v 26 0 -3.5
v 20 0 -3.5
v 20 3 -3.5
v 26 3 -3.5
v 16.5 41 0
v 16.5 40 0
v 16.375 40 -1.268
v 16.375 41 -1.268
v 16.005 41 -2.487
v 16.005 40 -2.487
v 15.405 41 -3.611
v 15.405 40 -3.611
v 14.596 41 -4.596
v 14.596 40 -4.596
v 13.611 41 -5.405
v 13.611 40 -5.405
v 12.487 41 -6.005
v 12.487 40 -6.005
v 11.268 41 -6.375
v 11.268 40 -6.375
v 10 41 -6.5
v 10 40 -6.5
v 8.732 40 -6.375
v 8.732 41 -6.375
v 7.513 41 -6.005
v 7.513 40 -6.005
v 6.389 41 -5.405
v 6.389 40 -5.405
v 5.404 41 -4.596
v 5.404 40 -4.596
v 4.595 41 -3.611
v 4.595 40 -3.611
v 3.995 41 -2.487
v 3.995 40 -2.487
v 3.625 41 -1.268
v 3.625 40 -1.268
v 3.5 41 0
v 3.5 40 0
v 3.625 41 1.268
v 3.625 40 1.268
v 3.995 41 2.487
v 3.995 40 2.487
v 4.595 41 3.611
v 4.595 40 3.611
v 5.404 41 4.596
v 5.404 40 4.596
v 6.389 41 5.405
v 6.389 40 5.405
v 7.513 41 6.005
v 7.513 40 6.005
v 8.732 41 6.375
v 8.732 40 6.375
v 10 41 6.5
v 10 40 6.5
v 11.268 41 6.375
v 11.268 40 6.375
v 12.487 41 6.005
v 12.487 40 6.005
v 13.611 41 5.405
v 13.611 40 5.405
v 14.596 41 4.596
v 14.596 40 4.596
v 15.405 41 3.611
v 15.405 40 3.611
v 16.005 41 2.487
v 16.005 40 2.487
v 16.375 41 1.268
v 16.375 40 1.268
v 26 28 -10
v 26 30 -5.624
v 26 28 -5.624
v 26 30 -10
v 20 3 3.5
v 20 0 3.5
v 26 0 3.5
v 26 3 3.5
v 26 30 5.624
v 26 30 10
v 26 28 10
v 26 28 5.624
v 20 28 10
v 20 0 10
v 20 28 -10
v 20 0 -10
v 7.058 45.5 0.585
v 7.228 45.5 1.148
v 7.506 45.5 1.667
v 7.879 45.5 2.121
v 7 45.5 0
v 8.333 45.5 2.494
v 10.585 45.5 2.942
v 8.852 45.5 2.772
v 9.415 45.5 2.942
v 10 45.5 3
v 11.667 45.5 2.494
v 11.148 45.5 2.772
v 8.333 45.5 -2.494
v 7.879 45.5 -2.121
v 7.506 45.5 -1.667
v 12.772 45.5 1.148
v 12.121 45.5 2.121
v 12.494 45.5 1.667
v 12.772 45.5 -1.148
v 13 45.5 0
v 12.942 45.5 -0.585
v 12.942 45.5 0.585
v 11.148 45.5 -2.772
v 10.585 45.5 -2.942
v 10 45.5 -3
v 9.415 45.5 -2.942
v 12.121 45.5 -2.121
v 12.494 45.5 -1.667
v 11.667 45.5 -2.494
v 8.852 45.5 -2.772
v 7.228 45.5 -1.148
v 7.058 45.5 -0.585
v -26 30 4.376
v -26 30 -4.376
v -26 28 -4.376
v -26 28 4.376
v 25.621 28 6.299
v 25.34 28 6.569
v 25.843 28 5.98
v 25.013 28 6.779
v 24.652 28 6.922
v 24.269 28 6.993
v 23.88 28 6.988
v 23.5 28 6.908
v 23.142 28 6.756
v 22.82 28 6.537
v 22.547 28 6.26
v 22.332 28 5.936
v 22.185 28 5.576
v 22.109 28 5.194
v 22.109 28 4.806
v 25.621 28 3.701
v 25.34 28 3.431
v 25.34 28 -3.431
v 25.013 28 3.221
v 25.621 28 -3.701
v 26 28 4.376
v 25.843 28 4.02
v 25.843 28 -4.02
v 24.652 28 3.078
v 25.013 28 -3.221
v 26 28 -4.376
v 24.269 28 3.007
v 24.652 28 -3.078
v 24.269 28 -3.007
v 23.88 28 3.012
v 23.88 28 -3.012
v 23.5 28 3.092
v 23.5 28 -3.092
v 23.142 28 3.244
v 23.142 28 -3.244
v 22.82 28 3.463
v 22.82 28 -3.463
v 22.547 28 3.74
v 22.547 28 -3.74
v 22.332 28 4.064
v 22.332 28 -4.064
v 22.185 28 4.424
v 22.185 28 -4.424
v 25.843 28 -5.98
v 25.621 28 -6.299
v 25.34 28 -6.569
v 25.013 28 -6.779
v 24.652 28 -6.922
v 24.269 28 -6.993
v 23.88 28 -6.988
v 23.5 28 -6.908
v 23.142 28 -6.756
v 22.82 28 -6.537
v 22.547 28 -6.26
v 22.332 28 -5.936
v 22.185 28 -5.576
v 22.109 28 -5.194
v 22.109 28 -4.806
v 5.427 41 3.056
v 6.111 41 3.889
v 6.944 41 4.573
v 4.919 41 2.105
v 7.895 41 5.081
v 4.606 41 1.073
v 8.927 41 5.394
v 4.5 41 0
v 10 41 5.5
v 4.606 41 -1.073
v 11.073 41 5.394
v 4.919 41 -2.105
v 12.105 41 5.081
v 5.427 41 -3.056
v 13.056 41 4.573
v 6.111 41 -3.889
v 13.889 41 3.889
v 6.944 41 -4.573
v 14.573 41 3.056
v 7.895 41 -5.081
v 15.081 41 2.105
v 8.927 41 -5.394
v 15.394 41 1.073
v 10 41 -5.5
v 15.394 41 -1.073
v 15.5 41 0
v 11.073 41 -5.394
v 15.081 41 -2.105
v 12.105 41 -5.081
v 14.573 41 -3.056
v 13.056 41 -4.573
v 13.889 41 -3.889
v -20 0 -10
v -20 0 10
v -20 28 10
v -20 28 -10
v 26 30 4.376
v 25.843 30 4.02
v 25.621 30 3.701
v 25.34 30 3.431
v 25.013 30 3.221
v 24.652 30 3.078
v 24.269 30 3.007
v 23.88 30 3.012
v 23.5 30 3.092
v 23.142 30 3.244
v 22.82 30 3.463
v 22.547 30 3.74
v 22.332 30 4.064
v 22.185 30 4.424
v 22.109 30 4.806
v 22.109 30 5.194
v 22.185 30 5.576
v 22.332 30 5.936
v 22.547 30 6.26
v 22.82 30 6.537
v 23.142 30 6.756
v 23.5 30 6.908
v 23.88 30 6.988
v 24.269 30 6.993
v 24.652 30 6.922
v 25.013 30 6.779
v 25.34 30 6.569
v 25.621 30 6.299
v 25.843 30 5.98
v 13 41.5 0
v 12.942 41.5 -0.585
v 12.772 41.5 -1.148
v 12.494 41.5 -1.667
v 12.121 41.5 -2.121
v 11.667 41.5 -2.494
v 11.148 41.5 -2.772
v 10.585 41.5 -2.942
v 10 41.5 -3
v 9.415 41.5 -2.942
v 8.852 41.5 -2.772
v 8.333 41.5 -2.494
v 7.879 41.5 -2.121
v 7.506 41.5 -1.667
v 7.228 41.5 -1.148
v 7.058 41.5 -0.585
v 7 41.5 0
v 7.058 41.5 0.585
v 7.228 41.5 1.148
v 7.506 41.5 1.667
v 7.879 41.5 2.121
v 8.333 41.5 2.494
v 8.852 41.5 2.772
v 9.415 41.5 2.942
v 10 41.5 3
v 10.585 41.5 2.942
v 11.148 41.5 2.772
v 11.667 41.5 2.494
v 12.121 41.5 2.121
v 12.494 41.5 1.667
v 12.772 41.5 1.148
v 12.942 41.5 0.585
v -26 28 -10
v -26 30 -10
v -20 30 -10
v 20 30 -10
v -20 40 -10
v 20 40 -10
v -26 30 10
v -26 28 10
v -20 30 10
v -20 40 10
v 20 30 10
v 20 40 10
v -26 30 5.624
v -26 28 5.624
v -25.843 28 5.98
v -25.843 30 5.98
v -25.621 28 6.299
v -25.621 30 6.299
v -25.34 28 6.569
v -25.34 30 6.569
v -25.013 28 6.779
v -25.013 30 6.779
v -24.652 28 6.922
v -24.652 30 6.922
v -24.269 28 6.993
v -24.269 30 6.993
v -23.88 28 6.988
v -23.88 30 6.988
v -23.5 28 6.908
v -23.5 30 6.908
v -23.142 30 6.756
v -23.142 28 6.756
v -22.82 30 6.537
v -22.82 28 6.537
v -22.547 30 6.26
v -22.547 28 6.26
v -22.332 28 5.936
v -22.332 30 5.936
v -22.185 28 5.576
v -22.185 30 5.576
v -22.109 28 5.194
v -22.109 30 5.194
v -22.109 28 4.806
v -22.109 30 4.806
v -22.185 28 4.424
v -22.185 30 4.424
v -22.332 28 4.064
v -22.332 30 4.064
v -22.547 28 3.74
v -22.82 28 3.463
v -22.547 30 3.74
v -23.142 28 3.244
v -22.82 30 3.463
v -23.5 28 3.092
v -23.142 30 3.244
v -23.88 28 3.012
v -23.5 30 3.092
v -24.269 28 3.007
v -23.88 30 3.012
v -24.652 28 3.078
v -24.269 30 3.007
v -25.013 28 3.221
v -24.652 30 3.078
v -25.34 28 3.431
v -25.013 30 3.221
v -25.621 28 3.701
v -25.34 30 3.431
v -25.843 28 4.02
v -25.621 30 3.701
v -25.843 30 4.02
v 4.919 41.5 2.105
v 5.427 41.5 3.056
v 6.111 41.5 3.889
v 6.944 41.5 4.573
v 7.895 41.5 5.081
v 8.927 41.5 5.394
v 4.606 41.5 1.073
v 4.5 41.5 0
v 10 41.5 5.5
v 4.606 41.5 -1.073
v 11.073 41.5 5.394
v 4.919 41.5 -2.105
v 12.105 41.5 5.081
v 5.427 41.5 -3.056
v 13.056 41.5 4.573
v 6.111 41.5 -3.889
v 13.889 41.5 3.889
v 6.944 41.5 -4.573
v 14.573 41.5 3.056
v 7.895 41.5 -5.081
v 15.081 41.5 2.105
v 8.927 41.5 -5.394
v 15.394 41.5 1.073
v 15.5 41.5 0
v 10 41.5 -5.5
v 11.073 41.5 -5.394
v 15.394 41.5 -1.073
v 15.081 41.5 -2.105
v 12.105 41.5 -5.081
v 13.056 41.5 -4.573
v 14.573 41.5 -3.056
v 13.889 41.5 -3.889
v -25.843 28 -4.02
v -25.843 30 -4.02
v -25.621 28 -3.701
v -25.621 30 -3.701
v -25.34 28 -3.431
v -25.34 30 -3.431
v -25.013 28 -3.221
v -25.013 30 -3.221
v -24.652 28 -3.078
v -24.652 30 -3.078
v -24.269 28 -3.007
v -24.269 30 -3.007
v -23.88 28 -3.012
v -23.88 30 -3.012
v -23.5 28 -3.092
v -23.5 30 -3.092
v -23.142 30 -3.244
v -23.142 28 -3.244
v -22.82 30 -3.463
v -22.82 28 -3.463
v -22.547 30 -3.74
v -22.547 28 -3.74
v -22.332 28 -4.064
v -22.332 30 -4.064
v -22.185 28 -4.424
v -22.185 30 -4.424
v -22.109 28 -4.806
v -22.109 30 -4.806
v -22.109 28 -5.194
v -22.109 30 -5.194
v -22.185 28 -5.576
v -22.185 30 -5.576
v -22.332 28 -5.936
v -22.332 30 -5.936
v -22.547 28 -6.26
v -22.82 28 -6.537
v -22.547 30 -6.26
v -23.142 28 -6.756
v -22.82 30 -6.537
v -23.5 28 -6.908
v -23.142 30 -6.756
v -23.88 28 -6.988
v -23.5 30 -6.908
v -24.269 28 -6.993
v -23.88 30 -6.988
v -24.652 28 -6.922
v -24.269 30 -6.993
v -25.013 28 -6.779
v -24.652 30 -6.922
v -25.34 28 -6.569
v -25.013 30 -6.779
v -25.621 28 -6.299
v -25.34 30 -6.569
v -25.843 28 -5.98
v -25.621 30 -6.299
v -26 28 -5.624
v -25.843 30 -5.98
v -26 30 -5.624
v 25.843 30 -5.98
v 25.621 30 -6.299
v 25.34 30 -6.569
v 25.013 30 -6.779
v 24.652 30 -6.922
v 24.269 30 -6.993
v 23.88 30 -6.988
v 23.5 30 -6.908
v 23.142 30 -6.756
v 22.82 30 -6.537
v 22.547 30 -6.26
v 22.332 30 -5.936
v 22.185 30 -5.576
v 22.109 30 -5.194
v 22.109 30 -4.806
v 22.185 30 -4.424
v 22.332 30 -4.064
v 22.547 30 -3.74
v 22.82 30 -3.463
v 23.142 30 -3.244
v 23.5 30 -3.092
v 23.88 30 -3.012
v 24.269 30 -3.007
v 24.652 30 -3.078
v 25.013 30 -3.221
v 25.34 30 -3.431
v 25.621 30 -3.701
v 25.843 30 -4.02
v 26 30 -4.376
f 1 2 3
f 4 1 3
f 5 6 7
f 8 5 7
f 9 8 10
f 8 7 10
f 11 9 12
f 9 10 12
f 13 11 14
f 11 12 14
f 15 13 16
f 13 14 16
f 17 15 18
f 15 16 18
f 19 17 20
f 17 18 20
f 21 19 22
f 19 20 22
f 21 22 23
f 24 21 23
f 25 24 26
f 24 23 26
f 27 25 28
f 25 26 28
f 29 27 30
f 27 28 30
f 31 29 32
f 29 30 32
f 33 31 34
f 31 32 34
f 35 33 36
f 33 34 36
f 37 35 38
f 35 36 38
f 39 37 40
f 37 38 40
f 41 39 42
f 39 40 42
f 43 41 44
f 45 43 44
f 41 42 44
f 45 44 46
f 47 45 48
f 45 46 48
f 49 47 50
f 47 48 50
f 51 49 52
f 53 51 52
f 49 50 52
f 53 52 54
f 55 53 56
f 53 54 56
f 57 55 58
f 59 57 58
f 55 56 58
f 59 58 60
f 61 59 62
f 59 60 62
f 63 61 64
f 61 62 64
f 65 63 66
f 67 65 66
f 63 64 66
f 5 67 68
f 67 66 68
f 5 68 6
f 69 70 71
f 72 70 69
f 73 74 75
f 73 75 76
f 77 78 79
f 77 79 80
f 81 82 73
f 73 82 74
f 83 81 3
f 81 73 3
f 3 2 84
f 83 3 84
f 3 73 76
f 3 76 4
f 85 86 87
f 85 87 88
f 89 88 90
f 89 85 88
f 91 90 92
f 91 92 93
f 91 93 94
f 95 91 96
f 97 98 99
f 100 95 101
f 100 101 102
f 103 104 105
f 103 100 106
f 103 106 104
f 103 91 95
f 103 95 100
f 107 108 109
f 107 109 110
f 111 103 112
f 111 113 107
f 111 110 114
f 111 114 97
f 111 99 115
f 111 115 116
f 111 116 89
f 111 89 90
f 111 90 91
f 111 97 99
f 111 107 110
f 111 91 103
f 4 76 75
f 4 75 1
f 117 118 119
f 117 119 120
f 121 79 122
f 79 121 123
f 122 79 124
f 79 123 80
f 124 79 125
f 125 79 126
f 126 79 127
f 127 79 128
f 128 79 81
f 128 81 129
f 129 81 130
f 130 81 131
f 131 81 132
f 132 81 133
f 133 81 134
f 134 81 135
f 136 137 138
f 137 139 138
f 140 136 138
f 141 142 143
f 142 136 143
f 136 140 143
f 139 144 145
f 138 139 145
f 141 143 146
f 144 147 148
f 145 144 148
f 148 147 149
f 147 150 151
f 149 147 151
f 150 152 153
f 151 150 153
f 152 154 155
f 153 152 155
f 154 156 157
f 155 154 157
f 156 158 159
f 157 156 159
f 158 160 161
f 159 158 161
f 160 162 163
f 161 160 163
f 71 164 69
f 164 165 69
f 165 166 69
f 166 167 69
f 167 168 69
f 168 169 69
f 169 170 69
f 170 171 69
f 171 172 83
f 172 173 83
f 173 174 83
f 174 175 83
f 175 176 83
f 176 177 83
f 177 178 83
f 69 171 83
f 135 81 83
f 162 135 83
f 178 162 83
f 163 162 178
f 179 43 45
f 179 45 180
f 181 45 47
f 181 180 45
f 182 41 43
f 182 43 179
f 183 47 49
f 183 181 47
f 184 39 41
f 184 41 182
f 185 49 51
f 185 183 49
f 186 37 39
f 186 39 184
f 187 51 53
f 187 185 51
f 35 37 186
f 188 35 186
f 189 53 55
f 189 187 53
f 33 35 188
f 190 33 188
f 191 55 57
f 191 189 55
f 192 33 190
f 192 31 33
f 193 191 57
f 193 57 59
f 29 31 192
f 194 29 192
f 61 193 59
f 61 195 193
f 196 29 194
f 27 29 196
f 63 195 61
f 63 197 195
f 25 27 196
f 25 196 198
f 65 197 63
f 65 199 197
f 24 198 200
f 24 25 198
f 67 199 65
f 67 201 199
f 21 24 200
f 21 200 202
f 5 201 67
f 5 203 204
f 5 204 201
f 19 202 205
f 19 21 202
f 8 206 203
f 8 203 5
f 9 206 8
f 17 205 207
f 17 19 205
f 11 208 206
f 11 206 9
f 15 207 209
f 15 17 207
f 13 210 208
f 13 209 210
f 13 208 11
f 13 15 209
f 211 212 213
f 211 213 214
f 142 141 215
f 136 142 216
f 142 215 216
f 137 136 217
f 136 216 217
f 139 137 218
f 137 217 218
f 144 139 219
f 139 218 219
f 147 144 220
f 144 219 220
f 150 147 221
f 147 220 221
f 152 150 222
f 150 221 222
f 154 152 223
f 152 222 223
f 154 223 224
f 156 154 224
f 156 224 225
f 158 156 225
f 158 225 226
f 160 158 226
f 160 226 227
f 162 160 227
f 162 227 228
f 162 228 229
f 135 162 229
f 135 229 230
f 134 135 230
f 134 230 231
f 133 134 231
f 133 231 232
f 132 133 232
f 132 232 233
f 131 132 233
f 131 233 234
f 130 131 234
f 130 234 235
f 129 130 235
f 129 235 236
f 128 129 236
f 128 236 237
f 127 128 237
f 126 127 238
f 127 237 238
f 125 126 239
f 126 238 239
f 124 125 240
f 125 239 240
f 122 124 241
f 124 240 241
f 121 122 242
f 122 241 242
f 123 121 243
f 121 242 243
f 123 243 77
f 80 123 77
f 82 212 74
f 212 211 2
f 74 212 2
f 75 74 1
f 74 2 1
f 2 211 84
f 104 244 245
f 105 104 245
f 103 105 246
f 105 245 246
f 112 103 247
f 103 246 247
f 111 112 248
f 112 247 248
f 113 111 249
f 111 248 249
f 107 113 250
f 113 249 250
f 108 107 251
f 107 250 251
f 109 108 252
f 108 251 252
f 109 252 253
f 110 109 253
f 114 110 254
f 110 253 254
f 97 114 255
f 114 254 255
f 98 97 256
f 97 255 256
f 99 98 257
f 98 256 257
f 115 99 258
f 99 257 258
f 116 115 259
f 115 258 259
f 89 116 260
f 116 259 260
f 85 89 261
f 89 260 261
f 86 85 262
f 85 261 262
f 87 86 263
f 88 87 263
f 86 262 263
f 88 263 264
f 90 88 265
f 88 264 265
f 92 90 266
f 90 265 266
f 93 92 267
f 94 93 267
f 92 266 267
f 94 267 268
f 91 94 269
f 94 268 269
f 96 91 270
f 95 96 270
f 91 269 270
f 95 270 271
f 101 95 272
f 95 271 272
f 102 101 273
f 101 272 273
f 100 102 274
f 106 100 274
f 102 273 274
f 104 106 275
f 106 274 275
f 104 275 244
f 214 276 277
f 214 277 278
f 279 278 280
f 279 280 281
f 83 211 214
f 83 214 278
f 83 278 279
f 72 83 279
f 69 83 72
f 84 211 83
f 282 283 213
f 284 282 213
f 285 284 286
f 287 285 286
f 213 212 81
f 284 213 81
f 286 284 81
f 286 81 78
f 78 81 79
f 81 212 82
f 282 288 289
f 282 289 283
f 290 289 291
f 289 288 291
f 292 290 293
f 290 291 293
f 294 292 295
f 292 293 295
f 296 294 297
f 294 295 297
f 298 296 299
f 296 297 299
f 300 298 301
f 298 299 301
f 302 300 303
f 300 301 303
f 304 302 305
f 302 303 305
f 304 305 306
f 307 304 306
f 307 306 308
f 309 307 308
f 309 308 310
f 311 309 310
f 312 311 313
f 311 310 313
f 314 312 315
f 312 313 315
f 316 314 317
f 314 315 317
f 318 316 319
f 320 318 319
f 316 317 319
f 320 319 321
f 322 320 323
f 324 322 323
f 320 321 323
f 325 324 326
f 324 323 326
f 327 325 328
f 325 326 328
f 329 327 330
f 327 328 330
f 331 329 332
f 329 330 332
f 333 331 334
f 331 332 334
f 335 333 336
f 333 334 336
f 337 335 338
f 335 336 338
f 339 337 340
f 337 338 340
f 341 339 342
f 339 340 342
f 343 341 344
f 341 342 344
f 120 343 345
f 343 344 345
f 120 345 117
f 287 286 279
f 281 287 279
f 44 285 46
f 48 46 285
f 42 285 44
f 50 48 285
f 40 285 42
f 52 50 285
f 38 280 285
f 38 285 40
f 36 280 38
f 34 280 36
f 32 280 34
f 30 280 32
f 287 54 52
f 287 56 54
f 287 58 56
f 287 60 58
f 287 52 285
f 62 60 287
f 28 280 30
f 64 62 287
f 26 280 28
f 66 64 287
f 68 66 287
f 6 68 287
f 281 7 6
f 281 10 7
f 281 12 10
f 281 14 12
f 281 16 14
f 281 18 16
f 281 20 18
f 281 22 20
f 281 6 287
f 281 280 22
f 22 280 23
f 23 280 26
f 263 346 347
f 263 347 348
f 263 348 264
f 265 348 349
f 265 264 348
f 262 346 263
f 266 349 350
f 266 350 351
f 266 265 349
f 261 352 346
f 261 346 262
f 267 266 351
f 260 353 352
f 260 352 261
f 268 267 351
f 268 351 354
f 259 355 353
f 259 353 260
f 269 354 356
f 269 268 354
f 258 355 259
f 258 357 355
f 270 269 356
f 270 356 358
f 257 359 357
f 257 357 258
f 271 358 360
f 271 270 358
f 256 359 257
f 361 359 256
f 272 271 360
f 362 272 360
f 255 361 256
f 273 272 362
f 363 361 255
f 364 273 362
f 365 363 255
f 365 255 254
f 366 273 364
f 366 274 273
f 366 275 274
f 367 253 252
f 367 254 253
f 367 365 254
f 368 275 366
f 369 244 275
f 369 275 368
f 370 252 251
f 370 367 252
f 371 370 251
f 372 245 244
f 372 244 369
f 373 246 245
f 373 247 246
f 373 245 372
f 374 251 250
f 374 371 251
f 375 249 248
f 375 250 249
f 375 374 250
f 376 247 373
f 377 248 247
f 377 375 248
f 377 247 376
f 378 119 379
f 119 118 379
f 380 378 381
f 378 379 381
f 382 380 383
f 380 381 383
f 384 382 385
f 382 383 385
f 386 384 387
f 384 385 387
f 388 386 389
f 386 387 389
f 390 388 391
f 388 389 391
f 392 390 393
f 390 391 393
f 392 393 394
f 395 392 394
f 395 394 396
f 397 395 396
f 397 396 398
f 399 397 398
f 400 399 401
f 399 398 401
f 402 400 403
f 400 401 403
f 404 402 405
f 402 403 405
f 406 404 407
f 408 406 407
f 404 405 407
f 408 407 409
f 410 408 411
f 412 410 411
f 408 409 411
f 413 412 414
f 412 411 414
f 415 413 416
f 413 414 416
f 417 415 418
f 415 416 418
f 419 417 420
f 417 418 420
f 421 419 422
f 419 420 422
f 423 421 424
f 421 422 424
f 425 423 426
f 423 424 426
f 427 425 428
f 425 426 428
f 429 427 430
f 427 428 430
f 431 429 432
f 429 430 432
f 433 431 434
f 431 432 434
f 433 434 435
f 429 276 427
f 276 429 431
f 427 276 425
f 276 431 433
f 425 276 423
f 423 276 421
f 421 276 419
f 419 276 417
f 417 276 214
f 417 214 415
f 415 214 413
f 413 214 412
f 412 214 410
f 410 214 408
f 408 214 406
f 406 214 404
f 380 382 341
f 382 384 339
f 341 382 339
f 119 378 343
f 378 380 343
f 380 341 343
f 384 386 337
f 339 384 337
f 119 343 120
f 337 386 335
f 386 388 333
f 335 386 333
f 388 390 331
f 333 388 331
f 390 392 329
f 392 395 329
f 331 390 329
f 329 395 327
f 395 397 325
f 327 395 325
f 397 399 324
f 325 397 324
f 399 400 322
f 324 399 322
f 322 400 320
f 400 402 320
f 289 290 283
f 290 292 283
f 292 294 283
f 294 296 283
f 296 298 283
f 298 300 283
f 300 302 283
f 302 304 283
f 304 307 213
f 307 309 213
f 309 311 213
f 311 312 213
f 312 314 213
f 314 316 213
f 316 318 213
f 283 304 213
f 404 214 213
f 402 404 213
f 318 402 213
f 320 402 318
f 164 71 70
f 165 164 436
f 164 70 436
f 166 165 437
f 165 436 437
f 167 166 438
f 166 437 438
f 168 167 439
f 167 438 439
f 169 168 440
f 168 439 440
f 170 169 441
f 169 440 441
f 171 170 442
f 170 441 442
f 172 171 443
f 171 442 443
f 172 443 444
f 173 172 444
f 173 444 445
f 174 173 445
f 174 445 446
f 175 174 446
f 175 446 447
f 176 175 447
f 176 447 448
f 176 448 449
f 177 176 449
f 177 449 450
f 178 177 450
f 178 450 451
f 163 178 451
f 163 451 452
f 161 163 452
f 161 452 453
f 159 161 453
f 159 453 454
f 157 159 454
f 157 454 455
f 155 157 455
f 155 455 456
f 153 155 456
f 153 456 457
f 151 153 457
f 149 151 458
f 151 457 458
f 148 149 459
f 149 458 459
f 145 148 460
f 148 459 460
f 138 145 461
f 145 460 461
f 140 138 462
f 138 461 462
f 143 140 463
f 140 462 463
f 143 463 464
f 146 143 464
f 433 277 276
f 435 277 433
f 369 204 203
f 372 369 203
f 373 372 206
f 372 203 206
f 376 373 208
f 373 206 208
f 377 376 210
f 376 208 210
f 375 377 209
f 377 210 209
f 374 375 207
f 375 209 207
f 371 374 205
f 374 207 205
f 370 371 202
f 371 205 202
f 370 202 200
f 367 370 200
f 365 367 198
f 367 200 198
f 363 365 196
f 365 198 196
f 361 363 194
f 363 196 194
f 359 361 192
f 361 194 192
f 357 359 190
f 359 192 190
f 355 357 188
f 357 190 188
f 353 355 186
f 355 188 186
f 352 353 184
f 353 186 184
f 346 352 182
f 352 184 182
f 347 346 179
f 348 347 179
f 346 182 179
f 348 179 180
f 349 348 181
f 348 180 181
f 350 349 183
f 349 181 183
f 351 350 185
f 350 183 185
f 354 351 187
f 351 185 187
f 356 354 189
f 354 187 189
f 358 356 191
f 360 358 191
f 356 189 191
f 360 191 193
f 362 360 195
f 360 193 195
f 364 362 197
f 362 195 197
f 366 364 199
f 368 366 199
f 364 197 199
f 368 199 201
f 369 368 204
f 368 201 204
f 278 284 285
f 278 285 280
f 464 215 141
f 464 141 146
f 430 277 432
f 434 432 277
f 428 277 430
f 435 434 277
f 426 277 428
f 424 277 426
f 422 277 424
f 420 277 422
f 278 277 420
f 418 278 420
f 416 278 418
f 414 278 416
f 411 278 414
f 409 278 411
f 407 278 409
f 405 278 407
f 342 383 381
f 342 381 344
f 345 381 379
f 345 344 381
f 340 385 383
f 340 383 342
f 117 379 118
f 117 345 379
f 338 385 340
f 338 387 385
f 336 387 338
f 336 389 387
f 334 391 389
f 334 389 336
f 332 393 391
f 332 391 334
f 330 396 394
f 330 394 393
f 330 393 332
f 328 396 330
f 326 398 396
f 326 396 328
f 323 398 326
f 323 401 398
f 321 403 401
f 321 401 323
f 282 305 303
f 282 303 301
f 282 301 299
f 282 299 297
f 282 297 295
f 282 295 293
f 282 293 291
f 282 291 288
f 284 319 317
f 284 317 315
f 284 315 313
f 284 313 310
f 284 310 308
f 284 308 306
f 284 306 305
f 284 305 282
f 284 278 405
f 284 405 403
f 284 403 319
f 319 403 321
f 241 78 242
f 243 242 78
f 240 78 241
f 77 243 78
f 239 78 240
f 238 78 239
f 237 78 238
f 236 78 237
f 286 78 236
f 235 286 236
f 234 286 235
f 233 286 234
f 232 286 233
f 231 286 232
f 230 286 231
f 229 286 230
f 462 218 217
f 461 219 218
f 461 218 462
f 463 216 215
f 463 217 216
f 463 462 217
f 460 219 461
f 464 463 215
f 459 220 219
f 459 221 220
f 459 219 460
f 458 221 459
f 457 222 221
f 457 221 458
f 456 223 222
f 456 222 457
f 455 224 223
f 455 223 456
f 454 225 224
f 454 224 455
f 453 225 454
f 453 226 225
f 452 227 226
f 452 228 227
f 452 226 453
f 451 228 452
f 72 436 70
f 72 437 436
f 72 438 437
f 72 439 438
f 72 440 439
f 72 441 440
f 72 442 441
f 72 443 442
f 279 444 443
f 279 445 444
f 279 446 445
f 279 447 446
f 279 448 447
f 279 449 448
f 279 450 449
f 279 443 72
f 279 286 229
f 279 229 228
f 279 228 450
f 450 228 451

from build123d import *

# Parameters (mm, degrees)
SKETCH_1_W          = 40
SKETCH_1_H          = 20
EXTRUDE_1_DEPTH     = 40
SKETCH_2_W          = 20
SKETCH_2_H          = 2
SKETCH_2_W_2        = 7
SKETCH_2_H_2        = 3
EXTRUDE_2_DEPTH     = 6
SKETCH_3_W          = 20
SKETCH_3_H          = 2
EXTRUDE_3_DEPTH     = 6
SKETCH_4_R          = 2
CUT_EXTRUDE_2_DEPTH = 6
SKETCH_5_R          = 6.5
EXTRUDE_4_DEPTH     = 1
SKETCH_6_R          = 5.5
EXTRUDE_5_DEPTH     = 0.5
SKETCH_7_R          = 3
EXTRUDE_6_DEPTH     = 4


with BuildPart() as part:
    # 草图1 → 凸台-拉伸1 (new body)
    with BuildSketch(Plane(origin=(0, 0, 0), x_dir=(1, 0, 0), z_dir=(0, 1, 0))):
        Rectangle(SKETCH_1_W, SKETCH_1_H)
    extrude(amount=EXTRUDE_1_DEPTH)

    # 草图2 → 凸台-拉伸2 (add)
    with BuildSketch(Plane(origin=(20, 0, 0), x_dir=(0, 0, -1), z_dir=(1, 0, 0))):
        with Locations((0, 29)):
            Rectangle(SKETCH_2_W, SKETCH_2_H)
        with Locations((0, 1.5)):
            Rectangle(SKETCH_2_W_2, SKETCH_2_H_2)
    extrude(amount=EXTRUDE_2_DEPTH)

    # 草图3 → 凸台-拉伸3 (add)
    with BuildSketch(Plane.ZY.offset(20)):
        with Locations((0, 29)):
            Rectangle(SKETCH_3_W, SKETCH_3_H)
    extrude(amount=EXTRUDE_3_DEPTH)

    # 草图4 → 切除-拉伸2 (cut)
    with BuildSketch(Plane(origin=(0, 30, 0), x_dir=(1, 0, 0), z_dir=(0, 1, 0))):
        with Locations((24.1, 5)):
            Circle(SKETCH_4_R)
        with Locations((24.1, -5)):
            Circle(SKETCH_4_R)
        with Locations((-24.1, 5)):
            Circle(SKETCH_4_R)
        with Locations((-24.1, -5)):
            Circle(SKETCH_4_R)
    extrude(amount=-CUT_EXTRUDE_2_DEPTH, mode=Mode.SUBTRACT)

    # 草图5 → 凸台-拉伸4 (add)
    with BuildSketch(Plane(origin=(0, 40, 0), x_dir=(1, 0, 0), z_dir=(0, 1, 0))):
        with Locations((10, 0)):
            Circle(SKETCH_5_R)
    extrude(amount=EXTRUDE_4_DEPTH)

    # 草图6 → 凸台-拉伸5 (add)
    with BuildSketch(Plane(origin=(0, 41, 0), x_dir=(1, 0, 0), z_dir=(0, 1, 0))):
        with Locations((10, 0)):
            Circle(SKETCH_6_R)
    extrude(amount=EXTRUDE_5_DEPTH)

    # 草图7 → 凸台-拉伸6 (add)
    with BuildSketch(Plane(origin=(0, 41.5, 0), x_dir=(1, 0, 0), z_dir=(0, 1, 0))):
        with Locations((10, 0)):
            Circle(SKETCH_7_R)
    extrude(amount=EXTRUDE_6_DEPTH)


solid = part.part
